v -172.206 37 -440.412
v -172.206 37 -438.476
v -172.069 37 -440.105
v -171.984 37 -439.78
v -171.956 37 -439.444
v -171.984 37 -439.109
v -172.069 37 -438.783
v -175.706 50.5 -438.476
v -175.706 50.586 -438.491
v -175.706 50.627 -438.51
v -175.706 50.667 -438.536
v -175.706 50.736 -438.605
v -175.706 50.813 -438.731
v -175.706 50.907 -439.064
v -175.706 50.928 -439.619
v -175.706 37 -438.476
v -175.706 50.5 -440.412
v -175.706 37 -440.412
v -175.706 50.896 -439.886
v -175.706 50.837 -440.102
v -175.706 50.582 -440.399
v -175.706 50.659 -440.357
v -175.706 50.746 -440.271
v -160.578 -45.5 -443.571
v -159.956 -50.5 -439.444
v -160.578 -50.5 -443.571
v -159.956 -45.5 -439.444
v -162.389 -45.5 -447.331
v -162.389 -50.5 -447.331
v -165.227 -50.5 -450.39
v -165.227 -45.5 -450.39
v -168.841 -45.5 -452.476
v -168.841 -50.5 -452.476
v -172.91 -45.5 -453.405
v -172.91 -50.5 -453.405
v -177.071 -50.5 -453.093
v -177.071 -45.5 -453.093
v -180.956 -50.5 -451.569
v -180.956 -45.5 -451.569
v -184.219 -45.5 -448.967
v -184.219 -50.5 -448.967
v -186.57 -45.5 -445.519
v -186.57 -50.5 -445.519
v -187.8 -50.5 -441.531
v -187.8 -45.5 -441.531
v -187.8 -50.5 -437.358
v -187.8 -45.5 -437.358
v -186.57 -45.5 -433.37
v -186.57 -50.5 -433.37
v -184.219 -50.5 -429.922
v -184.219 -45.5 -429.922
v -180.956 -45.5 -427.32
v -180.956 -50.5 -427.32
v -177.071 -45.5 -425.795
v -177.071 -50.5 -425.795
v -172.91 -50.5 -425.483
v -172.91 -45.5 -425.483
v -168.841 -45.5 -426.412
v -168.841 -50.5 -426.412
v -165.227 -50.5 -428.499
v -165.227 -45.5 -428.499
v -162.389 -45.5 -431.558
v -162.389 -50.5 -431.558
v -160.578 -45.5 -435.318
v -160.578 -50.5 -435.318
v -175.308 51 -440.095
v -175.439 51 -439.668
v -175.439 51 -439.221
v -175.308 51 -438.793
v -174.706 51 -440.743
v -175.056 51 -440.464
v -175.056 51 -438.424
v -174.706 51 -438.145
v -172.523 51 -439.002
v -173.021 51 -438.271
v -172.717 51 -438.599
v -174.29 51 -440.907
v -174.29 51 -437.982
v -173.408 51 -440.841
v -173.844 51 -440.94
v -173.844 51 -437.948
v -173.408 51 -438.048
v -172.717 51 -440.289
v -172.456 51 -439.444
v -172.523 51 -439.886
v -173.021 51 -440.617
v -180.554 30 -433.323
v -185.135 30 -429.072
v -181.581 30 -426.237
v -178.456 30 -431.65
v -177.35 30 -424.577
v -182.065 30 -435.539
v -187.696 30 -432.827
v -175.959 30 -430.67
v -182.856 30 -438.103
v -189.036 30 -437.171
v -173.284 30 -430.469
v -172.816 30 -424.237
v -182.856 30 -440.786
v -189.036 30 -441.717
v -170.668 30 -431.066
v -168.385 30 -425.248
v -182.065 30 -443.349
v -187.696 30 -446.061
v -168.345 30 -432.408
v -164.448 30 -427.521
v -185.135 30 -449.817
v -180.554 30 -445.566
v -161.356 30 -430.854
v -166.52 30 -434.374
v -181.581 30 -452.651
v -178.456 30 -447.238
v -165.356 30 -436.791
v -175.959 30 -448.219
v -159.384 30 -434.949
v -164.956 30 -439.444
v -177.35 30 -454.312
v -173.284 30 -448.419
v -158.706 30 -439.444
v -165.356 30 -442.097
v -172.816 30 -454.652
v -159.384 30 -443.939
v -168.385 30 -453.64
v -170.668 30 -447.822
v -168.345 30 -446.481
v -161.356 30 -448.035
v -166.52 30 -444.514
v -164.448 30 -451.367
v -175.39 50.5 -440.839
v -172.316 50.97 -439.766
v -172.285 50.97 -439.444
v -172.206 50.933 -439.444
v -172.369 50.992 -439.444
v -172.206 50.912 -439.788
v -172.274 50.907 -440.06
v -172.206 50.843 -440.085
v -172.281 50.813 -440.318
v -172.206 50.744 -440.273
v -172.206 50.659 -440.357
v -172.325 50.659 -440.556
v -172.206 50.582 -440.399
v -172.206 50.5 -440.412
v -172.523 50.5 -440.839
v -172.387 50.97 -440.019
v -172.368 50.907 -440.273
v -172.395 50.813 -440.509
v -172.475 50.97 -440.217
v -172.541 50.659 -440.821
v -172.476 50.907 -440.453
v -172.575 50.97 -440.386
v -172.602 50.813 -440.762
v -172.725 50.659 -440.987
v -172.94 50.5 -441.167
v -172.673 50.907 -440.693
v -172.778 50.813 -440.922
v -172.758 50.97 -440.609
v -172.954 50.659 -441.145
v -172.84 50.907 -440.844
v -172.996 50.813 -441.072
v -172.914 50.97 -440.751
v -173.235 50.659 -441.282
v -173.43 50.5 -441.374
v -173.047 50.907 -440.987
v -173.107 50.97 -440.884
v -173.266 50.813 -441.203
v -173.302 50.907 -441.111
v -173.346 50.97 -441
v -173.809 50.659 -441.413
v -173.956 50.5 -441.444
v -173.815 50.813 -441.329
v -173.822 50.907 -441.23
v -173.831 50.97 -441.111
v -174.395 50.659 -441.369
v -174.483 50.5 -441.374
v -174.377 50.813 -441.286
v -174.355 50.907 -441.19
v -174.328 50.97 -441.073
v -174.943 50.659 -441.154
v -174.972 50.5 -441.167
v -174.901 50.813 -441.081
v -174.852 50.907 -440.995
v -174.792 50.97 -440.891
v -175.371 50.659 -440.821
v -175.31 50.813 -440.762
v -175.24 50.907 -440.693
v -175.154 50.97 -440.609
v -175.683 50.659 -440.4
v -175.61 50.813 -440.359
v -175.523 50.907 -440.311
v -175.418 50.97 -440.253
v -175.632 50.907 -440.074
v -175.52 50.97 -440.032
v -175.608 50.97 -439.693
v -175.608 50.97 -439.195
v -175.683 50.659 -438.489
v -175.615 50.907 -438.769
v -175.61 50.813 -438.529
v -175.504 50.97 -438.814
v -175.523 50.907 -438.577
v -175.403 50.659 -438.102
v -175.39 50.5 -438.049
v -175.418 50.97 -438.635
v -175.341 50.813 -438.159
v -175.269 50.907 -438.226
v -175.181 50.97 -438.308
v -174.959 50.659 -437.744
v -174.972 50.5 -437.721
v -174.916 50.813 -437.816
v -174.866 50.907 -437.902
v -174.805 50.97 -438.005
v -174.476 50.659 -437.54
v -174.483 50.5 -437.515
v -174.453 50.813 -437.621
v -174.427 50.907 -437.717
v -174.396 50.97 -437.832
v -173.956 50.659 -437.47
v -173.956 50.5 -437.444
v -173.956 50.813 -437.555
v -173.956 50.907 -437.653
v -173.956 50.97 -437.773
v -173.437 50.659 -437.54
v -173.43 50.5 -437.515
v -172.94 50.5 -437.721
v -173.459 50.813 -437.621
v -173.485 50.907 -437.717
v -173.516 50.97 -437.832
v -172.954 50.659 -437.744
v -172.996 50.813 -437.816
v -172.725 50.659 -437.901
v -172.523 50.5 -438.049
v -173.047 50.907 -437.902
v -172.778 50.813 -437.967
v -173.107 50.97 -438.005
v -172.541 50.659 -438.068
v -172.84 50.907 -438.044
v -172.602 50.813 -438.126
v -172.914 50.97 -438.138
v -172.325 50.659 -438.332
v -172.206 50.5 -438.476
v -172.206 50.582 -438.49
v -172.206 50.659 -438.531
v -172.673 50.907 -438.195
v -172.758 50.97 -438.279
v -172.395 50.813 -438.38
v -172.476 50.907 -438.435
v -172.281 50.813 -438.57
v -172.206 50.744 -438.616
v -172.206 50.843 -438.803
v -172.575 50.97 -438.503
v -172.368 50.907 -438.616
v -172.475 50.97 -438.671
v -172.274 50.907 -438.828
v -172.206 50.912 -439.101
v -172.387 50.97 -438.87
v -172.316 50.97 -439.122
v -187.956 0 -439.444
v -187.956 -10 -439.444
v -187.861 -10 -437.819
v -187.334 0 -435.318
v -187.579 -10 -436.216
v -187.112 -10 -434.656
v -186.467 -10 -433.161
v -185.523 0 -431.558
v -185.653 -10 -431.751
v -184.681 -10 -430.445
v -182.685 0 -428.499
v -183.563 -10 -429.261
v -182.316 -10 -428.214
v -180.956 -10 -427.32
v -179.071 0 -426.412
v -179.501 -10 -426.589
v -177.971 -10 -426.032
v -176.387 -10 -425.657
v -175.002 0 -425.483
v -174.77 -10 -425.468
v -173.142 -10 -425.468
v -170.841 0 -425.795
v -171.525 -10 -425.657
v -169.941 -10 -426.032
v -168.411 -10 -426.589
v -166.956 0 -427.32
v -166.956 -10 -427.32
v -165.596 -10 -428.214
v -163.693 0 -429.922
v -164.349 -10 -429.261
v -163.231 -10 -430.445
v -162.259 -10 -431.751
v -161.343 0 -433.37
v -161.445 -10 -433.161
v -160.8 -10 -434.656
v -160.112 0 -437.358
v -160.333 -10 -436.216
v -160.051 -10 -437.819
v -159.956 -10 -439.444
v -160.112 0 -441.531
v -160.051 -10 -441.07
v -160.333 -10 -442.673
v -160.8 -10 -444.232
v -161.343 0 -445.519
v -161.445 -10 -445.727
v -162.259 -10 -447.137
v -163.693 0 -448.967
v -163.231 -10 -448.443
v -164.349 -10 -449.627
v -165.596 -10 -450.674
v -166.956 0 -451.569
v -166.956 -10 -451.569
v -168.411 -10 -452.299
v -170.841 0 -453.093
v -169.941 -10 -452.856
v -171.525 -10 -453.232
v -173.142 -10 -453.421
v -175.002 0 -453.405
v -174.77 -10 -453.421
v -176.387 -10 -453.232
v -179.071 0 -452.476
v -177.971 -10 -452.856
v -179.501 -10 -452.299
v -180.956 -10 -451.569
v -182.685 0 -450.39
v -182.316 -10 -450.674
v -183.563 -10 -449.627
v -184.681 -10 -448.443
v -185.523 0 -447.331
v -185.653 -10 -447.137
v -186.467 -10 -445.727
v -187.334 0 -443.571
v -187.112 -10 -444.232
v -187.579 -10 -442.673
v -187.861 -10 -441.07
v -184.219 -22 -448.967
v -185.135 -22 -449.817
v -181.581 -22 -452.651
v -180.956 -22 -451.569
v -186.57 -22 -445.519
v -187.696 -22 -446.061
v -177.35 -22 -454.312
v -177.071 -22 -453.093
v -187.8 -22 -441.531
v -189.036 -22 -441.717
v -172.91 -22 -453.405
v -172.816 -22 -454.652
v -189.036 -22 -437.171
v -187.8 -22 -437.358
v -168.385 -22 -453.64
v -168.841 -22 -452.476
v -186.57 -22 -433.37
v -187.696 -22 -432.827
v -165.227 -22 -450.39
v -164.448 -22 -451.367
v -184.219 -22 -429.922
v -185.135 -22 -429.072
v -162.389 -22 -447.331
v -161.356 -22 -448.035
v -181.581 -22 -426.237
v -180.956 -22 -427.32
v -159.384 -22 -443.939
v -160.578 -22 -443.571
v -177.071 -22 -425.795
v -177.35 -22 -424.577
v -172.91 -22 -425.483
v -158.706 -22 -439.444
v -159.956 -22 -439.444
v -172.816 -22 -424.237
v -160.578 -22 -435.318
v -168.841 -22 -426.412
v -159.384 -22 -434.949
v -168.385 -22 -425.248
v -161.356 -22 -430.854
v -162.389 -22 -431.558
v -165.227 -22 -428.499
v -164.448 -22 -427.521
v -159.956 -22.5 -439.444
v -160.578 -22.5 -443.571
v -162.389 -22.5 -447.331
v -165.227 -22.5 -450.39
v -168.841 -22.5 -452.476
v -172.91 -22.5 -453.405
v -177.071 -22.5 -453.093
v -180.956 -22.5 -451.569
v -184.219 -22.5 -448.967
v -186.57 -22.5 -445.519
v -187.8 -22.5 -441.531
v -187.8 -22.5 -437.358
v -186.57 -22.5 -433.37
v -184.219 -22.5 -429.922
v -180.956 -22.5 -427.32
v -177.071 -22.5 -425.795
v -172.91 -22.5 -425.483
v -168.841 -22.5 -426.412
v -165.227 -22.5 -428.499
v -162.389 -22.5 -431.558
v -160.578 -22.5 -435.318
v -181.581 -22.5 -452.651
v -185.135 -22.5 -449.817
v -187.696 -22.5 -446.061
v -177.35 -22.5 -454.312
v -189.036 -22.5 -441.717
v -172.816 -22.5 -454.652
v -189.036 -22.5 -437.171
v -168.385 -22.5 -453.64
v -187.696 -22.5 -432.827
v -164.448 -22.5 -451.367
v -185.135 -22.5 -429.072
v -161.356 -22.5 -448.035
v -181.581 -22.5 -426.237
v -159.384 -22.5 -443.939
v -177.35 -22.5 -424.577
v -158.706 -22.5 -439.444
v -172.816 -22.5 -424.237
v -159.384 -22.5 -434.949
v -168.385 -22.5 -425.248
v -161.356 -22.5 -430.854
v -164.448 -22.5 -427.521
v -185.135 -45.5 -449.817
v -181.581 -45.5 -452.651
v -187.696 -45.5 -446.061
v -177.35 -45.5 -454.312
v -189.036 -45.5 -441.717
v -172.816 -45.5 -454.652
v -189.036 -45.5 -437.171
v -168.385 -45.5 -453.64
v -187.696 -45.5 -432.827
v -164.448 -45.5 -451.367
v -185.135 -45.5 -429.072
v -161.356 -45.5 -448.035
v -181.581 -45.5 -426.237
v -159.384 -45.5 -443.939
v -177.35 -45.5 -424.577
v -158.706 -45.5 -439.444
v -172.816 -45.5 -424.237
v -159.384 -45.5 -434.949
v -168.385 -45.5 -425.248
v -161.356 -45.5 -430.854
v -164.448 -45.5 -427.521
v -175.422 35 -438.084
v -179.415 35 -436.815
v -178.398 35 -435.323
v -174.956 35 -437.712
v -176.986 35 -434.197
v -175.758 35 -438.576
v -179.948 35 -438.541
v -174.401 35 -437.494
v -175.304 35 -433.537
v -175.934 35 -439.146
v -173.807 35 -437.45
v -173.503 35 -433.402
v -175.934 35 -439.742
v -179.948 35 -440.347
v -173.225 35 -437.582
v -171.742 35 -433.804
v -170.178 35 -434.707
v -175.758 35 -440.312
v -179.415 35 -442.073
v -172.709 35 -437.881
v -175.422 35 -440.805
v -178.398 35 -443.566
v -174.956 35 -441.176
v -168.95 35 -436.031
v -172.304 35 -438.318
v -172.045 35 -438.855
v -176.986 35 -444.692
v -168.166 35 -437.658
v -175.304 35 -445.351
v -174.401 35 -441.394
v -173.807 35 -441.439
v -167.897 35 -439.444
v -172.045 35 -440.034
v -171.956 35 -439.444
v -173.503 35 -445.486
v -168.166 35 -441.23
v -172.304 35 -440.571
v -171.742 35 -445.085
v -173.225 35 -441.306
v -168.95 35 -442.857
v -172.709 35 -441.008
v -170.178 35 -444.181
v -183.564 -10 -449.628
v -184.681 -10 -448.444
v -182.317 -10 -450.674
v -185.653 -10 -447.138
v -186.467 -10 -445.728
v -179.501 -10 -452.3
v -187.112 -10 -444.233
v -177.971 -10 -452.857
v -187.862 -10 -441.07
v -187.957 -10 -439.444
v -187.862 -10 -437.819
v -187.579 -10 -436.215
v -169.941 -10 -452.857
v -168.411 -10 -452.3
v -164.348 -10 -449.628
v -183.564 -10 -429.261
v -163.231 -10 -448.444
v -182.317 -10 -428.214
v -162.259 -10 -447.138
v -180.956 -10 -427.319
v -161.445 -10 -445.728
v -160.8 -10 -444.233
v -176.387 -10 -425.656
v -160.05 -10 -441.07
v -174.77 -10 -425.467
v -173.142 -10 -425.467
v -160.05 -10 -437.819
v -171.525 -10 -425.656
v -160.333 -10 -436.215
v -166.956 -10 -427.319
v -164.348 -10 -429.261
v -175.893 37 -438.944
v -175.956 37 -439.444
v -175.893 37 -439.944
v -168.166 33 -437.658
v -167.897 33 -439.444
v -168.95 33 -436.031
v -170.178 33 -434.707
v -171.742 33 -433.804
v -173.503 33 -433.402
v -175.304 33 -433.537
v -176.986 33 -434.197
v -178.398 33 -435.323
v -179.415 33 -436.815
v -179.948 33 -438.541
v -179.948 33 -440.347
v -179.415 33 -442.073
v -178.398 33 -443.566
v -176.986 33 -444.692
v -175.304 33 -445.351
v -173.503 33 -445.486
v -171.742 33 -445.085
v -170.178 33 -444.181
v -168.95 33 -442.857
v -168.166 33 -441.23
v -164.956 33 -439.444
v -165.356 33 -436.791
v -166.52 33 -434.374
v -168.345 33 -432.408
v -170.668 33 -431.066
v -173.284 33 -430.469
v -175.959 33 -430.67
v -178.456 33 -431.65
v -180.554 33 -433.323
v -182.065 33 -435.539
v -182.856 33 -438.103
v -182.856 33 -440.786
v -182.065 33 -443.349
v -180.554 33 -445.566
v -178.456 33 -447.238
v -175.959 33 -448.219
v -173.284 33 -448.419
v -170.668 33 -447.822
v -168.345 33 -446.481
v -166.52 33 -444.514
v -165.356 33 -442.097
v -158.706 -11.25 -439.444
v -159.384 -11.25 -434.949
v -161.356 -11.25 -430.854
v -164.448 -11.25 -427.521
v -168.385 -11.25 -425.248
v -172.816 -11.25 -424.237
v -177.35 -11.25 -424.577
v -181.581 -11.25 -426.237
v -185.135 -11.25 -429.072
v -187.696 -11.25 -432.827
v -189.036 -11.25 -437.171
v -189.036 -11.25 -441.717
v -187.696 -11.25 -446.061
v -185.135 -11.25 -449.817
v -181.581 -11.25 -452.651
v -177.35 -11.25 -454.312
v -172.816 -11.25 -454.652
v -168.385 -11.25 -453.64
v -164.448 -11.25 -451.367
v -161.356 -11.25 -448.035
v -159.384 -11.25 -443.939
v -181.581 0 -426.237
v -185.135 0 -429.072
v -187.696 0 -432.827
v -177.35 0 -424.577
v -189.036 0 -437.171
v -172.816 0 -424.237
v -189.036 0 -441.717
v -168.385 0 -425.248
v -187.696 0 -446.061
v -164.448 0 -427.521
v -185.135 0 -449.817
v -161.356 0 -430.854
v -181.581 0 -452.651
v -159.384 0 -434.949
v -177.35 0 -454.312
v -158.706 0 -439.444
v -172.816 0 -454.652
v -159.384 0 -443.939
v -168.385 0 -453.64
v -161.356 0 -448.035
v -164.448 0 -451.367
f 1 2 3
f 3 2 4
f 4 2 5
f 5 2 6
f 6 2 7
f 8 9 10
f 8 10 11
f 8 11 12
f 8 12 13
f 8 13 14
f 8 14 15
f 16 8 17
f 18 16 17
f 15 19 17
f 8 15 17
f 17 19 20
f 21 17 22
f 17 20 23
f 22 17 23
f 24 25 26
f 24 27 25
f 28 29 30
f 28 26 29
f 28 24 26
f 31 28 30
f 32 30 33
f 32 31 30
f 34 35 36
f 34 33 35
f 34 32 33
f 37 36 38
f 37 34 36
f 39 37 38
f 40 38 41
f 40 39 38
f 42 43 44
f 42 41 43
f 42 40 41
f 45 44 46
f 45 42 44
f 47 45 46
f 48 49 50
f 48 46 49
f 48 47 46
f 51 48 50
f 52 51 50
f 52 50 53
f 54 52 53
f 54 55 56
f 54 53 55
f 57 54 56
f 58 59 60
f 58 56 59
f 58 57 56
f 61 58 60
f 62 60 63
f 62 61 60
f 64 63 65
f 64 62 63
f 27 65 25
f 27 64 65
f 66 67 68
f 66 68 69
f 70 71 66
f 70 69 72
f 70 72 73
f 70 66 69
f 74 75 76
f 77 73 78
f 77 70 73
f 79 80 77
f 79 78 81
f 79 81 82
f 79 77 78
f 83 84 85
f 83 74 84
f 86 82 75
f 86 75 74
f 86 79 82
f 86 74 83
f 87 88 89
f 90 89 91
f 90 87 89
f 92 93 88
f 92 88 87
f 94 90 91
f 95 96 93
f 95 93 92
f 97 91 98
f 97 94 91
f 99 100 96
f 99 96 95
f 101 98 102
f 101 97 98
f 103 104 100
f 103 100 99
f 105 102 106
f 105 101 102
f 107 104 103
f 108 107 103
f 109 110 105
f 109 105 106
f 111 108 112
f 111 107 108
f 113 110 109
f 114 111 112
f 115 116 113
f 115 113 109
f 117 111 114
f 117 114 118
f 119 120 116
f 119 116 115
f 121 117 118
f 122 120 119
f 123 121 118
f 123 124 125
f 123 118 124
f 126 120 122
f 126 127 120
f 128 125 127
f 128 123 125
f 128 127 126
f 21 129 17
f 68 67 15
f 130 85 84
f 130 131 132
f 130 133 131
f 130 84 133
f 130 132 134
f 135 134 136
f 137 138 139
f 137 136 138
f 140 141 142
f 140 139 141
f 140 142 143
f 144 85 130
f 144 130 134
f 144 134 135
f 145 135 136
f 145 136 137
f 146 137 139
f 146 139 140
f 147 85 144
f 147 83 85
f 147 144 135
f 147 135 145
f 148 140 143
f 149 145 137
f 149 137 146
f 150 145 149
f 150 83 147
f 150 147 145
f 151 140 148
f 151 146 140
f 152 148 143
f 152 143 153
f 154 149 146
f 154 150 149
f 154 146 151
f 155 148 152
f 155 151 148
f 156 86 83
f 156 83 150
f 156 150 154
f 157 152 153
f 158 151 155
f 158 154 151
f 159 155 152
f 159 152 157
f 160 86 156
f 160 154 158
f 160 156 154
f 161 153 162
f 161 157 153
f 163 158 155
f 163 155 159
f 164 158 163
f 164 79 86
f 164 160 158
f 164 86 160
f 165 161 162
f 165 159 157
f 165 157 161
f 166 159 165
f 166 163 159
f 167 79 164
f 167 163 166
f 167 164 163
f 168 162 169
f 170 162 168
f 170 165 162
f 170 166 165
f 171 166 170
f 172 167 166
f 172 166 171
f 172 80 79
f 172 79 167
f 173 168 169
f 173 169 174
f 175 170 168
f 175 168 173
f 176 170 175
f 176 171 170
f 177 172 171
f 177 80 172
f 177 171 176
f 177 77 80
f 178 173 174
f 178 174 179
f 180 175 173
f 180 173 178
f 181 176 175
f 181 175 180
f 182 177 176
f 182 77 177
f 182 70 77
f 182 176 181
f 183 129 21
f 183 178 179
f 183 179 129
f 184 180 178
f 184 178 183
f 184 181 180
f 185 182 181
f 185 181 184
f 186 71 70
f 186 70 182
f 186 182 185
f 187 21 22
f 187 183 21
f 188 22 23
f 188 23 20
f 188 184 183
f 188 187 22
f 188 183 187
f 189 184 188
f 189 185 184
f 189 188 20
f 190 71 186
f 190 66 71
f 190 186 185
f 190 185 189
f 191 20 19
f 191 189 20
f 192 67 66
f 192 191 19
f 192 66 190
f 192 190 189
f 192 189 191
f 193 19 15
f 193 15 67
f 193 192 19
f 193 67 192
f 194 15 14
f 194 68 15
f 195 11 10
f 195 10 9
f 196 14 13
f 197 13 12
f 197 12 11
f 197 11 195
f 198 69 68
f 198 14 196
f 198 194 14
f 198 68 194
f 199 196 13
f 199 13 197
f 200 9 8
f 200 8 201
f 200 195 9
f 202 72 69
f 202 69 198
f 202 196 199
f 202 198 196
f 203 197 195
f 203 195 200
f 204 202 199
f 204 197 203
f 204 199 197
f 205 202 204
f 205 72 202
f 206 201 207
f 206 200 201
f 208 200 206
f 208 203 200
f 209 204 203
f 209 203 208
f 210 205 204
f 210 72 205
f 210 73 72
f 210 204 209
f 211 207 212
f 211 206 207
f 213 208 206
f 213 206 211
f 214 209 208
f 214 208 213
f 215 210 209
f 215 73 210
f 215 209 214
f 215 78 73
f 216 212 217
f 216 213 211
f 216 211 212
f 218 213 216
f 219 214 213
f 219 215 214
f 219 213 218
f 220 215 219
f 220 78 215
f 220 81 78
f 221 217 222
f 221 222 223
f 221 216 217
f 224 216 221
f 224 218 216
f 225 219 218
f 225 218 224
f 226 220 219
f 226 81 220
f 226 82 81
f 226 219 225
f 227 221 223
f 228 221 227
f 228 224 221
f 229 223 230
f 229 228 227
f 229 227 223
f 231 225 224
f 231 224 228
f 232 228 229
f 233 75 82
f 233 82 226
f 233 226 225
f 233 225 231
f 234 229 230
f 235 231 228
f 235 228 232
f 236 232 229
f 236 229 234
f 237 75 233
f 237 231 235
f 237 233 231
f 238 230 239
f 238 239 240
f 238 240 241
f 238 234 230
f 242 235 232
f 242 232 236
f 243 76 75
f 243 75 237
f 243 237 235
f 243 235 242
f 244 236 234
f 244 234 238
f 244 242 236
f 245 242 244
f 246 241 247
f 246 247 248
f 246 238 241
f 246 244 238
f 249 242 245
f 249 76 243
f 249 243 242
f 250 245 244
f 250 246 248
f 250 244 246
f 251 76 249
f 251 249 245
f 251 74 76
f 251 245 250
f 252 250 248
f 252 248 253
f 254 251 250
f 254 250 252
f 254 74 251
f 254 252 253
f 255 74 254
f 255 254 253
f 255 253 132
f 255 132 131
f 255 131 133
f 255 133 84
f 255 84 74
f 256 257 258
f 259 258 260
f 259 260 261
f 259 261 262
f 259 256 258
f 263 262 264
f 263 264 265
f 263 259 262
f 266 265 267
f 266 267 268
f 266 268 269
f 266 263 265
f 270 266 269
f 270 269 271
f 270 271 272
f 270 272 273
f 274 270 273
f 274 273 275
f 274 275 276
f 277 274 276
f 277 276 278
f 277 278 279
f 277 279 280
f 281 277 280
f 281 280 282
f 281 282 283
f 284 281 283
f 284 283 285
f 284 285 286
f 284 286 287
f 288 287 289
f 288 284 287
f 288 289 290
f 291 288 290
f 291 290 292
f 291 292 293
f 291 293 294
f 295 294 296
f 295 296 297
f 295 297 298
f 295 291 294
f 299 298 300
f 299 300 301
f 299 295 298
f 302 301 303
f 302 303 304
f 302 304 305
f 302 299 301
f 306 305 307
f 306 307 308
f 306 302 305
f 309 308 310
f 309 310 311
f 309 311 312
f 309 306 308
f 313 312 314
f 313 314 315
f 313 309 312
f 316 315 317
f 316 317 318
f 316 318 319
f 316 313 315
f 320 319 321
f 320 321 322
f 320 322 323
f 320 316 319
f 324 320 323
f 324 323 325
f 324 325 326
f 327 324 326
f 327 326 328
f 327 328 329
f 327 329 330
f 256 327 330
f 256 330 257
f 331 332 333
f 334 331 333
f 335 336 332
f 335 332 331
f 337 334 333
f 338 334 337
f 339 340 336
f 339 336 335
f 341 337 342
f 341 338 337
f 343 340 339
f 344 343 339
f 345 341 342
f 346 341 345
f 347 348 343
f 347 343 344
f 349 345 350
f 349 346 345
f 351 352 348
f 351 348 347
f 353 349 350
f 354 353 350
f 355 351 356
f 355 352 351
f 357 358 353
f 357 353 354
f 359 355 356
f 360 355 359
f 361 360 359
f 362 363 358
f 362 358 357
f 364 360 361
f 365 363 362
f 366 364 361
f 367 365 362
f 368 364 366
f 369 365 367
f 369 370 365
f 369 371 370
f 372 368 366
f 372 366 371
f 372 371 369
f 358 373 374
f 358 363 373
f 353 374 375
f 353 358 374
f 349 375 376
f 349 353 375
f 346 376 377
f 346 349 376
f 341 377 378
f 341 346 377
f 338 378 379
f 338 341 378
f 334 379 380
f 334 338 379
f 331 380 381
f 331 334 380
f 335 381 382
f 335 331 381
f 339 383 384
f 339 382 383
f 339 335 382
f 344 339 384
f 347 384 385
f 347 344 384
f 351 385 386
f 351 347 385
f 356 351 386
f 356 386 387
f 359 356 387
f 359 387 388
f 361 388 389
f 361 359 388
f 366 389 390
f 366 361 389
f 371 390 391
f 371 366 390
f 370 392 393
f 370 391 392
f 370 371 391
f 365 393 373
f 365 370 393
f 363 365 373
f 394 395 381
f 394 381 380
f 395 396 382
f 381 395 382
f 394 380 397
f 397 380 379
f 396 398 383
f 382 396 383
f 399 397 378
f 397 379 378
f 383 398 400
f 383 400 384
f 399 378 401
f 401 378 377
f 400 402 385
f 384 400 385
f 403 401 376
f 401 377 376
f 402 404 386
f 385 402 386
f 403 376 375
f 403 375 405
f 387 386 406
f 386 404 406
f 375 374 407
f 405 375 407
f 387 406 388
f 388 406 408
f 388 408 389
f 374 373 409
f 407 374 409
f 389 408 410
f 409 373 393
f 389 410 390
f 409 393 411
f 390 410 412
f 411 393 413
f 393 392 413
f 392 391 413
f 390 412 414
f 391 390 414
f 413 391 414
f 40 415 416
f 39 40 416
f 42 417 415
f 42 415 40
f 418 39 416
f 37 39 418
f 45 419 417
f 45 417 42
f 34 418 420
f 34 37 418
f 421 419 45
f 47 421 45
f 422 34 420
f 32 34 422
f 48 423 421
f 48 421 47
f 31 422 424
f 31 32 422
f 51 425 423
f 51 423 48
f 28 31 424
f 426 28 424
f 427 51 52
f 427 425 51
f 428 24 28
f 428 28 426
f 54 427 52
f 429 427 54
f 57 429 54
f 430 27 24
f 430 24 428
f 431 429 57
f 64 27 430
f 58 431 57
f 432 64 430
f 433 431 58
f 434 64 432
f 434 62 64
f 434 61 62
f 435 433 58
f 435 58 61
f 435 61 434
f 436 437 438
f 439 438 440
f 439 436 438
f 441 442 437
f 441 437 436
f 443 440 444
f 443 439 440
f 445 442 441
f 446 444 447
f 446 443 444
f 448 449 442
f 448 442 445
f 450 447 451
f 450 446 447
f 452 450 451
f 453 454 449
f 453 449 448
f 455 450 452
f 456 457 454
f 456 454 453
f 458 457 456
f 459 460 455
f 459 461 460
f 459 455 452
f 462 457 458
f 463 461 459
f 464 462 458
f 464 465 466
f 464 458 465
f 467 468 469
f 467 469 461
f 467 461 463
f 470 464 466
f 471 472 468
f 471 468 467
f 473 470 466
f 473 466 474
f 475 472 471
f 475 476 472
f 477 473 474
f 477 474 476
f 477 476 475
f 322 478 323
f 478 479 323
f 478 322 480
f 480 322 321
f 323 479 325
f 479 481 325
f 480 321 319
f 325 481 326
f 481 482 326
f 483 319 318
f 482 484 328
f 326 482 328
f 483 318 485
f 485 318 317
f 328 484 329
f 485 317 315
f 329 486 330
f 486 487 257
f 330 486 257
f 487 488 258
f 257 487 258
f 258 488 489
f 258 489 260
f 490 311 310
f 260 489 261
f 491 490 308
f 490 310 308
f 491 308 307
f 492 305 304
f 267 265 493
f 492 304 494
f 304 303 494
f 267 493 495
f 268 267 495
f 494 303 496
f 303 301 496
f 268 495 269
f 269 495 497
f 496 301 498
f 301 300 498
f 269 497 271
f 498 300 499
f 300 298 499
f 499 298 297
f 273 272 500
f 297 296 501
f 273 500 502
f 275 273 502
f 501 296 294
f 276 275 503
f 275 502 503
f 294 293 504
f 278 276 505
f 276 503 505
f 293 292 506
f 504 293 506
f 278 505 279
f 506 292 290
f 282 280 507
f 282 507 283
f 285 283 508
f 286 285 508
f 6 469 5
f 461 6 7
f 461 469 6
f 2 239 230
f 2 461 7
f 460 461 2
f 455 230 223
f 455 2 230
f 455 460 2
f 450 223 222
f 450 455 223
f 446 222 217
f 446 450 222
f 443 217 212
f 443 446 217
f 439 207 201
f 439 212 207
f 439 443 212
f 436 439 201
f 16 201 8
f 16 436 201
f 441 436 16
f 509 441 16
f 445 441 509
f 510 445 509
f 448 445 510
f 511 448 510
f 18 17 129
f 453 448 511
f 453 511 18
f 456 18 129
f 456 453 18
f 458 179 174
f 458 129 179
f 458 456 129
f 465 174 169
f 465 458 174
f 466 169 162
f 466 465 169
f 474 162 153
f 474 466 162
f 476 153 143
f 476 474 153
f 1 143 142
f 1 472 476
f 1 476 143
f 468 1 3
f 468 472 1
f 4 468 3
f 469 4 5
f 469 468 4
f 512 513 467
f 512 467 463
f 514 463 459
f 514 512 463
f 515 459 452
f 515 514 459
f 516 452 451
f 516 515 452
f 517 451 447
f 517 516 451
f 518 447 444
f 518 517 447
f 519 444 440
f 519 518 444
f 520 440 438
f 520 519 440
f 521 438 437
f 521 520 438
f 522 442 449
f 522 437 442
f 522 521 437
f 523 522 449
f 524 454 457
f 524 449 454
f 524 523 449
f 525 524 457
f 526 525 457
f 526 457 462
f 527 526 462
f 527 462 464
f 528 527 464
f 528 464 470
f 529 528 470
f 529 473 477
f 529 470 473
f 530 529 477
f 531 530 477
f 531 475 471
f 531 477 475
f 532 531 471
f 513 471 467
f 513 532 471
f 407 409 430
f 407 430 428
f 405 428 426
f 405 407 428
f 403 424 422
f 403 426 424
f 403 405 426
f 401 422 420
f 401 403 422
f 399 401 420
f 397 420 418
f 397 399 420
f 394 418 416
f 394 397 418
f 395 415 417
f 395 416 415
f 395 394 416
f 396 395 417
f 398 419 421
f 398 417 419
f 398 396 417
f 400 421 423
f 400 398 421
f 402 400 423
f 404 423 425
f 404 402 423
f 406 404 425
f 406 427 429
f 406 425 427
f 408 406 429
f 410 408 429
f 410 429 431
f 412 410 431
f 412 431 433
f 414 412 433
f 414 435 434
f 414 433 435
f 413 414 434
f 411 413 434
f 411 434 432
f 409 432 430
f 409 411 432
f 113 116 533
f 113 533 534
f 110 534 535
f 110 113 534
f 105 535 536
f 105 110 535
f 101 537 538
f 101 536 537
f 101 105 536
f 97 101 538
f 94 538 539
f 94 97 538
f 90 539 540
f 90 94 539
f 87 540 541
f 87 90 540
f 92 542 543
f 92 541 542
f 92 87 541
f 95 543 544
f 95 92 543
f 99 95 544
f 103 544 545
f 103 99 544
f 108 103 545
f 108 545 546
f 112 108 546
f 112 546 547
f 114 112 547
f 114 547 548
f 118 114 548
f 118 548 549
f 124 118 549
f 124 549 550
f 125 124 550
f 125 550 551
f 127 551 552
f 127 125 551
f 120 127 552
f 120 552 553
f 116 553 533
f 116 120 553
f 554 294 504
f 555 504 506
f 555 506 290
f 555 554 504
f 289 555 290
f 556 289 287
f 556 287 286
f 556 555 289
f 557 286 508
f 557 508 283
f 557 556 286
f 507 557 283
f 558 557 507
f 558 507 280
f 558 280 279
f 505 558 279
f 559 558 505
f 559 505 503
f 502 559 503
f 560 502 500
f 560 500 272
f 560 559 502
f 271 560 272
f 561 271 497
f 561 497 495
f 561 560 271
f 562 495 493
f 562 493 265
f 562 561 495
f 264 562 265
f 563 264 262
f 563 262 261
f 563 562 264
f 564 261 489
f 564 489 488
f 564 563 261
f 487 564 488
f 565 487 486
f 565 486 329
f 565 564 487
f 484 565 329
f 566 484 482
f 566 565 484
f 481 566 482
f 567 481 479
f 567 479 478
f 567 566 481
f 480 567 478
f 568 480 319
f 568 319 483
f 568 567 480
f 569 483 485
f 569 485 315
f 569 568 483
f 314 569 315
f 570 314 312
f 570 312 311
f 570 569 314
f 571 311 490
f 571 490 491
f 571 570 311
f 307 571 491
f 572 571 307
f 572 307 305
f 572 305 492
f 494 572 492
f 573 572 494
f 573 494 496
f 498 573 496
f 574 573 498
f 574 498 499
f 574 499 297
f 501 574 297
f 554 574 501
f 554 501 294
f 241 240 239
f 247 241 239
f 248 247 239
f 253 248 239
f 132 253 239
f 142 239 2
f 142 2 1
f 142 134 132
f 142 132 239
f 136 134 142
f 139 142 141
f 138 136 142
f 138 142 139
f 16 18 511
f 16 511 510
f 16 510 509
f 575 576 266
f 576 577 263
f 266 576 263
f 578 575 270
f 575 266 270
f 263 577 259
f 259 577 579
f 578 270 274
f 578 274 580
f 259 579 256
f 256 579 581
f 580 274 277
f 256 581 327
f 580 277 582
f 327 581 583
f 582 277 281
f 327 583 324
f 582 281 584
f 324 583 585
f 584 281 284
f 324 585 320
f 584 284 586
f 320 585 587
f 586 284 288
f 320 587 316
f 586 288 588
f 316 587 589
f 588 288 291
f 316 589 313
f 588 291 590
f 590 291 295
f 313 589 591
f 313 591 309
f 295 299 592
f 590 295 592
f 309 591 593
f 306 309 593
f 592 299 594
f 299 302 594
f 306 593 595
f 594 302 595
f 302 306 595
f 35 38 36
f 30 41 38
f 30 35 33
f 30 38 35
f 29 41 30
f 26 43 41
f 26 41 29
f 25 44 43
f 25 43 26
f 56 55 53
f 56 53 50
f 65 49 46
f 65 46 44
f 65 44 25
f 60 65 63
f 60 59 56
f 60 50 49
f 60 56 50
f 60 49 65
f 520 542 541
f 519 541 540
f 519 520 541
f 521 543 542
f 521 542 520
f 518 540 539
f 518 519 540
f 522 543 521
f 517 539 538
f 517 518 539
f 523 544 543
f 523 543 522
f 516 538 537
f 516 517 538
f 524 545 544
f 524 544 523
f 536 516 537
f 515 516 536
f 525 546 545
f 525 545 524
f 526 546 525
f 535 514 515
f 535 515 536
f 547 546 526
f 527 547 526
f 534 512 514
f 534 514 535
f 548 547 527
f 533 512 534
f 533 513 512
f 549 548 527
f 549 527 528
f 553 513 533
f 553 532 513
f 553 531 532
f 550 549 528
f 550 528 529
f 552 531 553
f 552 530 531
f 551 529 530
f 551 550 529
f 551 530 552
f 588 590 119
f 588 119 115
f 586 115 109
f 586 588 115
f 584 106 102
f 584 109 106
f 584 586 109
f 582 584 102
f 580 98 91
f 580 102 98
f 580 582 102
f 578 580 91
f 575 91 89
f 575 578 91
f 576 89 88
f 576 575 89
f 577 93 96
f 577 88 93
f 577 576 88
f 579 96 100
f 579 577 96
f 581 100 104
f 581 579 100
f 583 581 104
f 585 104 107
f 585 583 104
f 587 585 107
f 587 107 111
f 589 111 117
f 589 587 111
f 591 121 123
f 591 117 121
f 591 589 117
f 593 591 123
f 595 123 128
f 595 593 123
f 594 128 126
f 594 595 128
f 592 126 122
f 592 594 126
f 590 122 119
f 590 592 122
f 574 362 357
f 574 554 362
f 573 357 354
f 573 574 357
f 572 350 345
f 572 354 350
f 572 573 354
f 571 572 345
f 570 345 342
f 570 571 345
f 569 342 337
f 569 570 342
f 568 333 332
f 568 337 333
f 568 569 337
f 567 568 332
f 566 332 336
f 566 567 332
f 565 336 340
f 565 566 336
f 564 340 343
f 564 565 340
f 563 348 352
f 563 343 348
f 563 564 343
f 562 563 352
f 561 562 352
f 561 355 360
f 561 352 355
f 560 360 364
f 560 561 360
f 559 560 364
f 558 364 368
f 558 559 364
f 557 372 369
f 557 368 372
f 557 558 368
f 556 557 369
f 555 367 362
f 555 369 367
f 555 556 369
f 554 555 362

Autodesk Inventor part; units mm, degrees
ref_plane "YZ Plane" through (0, 0, 0) normal (1, 0, 0) x (0, 1, 0)
sketch "Sketch1" plane through (0, 0, 0) normal (0, 1, 0) x (-1, 0, 0)
  circle A0 centre (173.9561, -439.4442) radius 14
  dimension "d17" = 28
extrude "Extrusion1" add sketch "Sketch1" against normal blind 10
sketch "Sketch2" plane through (-173.9561, -10, -439.4442) normal (0, -1, 0) x (1, 0, 0)
  circle A0 centre (0, 0) radius 15.25
  point P0 (173.9561, 439.4442)
  dimension "d20" = 30.5
extrude "Extrusion2" add sketch "Sketch2" along normal blind 12
chamfer "Chamfer1" distance 1.25 angle 45 1 edges at (-189.2061, -10, -439.4442)
sketch "Sketch4" plane through (-173.9561, -22, -439.4442) normal (0, -1, 0) x (1, 0, 0)
  circle A0 centre (0, 0) radius 14
  point P0 (173.9561, 439.4442)
  dimension "d26" = 28
extrude "Extrusion3" add sketch "Sketch4" along normal blind 0.5
sketch "Sketch5" plane through (-173.9561, -22.5, -439.4442) normal (0, -1, 0) x (1, 0, 0)
  circle A0 centre (0, 0) radius 15.25
  point P0 (173.9561, 439.4442)
  dimension "d29" = 30.5
extrude "Extrusion4" add sketch "Sketch5" along normal blind 23
sketch "Sketch6" plane through (-173.9561, -45.5, -439.4442) normal (0, -1, 0) x (1, 0, 0)
  circle A0 centre (0, 0) radius 14
  point P0 (173.9561, 439.4442)
  dimension "d32" = 28
extrude "Extrusion5" add sketch "Sketch6" along normal blind 5
sketch "Sketch7" plane through (-173.9561, 0, -439.4442) normal (0, 1, 0) x (1, 0, 0)
  circle A0 centre (0, 0) radius 15.25
  point P0 (173.9561, -439.4442)
  dimension "d35" = 30.5
extrude "Extrusion6" add sketch "Sketch7" along normal blind 30
sketch "Sketch8" plane through (-173.9561, 30, -439.4442) normal (0, 1, 0) x (1, 0, 0)
  circle A0 centre (0, 0) radius 9
  point P0 (173.9561, -439.4442)
  dimension "d38" = 18
extrude "Extrusion7" add sketch "Sketch8" along normal blind 3
sketch "Sketch10" plane through (-173.9561, 33, -439.4442) normal (0, 1, 0) x (1, 0, 0)
  circle A0 centre (0, 0) radius 6.0592
  point P0 (173.9561, -439.4442)
extrude "Extrusion9" add sketch "Sketch10" along normal blind 2
sketch "Sketch11" plane through (-173.9561, 35, -439.4442) normal (0, 1, 0) x (1, 0, 0)
  circle A0 centre (0, 0) radius 2
  point P0 (173.9561, -439.4442)
  dimension "d45" = 4
extrude "Extrusion10" add sketch "Sketch11" along normal blind 16
fillet "Fillet1" radius 0.5 1 edges at (-175.9561, 51, -439.4442)
sketch "Sketch12" plane through (-173.9561, 51, -439.4442) normal (0, 1, 0) x (1, 0, 0)
  circle A0 centre (0, 0) radius 2 projected
  circle A1 centre (0, 0) radius 2 projected
  line L0 (-1.75, -0.9682) -> (-1.75, 0.9682)
  line L1 (1.75, -0.9682) -> (1.75, 0.9682)
  point P0 (173.9561, -439.4442)
  dimension "d49" = 3.5
  dimension "d50" = 1.75
extrude "Extrusion11" cut sketch "Sketch12" against normal blind 14 contours A0 L1 | L0 A0
ref_plane "Work Plane1" through (-173.9561, 20, -439.4442) normal (0, 1, 0) x (1, 0, 0)
ref_plane "Work Plane2" through (-173.9561, 5, -439.4442) normal (0, -1, 0) x (1, 0, 0)
split_face "Split1"
split_face "Split2"
equation "\"d50\" = 0.5 * d49"
properties part number "14-0001"
